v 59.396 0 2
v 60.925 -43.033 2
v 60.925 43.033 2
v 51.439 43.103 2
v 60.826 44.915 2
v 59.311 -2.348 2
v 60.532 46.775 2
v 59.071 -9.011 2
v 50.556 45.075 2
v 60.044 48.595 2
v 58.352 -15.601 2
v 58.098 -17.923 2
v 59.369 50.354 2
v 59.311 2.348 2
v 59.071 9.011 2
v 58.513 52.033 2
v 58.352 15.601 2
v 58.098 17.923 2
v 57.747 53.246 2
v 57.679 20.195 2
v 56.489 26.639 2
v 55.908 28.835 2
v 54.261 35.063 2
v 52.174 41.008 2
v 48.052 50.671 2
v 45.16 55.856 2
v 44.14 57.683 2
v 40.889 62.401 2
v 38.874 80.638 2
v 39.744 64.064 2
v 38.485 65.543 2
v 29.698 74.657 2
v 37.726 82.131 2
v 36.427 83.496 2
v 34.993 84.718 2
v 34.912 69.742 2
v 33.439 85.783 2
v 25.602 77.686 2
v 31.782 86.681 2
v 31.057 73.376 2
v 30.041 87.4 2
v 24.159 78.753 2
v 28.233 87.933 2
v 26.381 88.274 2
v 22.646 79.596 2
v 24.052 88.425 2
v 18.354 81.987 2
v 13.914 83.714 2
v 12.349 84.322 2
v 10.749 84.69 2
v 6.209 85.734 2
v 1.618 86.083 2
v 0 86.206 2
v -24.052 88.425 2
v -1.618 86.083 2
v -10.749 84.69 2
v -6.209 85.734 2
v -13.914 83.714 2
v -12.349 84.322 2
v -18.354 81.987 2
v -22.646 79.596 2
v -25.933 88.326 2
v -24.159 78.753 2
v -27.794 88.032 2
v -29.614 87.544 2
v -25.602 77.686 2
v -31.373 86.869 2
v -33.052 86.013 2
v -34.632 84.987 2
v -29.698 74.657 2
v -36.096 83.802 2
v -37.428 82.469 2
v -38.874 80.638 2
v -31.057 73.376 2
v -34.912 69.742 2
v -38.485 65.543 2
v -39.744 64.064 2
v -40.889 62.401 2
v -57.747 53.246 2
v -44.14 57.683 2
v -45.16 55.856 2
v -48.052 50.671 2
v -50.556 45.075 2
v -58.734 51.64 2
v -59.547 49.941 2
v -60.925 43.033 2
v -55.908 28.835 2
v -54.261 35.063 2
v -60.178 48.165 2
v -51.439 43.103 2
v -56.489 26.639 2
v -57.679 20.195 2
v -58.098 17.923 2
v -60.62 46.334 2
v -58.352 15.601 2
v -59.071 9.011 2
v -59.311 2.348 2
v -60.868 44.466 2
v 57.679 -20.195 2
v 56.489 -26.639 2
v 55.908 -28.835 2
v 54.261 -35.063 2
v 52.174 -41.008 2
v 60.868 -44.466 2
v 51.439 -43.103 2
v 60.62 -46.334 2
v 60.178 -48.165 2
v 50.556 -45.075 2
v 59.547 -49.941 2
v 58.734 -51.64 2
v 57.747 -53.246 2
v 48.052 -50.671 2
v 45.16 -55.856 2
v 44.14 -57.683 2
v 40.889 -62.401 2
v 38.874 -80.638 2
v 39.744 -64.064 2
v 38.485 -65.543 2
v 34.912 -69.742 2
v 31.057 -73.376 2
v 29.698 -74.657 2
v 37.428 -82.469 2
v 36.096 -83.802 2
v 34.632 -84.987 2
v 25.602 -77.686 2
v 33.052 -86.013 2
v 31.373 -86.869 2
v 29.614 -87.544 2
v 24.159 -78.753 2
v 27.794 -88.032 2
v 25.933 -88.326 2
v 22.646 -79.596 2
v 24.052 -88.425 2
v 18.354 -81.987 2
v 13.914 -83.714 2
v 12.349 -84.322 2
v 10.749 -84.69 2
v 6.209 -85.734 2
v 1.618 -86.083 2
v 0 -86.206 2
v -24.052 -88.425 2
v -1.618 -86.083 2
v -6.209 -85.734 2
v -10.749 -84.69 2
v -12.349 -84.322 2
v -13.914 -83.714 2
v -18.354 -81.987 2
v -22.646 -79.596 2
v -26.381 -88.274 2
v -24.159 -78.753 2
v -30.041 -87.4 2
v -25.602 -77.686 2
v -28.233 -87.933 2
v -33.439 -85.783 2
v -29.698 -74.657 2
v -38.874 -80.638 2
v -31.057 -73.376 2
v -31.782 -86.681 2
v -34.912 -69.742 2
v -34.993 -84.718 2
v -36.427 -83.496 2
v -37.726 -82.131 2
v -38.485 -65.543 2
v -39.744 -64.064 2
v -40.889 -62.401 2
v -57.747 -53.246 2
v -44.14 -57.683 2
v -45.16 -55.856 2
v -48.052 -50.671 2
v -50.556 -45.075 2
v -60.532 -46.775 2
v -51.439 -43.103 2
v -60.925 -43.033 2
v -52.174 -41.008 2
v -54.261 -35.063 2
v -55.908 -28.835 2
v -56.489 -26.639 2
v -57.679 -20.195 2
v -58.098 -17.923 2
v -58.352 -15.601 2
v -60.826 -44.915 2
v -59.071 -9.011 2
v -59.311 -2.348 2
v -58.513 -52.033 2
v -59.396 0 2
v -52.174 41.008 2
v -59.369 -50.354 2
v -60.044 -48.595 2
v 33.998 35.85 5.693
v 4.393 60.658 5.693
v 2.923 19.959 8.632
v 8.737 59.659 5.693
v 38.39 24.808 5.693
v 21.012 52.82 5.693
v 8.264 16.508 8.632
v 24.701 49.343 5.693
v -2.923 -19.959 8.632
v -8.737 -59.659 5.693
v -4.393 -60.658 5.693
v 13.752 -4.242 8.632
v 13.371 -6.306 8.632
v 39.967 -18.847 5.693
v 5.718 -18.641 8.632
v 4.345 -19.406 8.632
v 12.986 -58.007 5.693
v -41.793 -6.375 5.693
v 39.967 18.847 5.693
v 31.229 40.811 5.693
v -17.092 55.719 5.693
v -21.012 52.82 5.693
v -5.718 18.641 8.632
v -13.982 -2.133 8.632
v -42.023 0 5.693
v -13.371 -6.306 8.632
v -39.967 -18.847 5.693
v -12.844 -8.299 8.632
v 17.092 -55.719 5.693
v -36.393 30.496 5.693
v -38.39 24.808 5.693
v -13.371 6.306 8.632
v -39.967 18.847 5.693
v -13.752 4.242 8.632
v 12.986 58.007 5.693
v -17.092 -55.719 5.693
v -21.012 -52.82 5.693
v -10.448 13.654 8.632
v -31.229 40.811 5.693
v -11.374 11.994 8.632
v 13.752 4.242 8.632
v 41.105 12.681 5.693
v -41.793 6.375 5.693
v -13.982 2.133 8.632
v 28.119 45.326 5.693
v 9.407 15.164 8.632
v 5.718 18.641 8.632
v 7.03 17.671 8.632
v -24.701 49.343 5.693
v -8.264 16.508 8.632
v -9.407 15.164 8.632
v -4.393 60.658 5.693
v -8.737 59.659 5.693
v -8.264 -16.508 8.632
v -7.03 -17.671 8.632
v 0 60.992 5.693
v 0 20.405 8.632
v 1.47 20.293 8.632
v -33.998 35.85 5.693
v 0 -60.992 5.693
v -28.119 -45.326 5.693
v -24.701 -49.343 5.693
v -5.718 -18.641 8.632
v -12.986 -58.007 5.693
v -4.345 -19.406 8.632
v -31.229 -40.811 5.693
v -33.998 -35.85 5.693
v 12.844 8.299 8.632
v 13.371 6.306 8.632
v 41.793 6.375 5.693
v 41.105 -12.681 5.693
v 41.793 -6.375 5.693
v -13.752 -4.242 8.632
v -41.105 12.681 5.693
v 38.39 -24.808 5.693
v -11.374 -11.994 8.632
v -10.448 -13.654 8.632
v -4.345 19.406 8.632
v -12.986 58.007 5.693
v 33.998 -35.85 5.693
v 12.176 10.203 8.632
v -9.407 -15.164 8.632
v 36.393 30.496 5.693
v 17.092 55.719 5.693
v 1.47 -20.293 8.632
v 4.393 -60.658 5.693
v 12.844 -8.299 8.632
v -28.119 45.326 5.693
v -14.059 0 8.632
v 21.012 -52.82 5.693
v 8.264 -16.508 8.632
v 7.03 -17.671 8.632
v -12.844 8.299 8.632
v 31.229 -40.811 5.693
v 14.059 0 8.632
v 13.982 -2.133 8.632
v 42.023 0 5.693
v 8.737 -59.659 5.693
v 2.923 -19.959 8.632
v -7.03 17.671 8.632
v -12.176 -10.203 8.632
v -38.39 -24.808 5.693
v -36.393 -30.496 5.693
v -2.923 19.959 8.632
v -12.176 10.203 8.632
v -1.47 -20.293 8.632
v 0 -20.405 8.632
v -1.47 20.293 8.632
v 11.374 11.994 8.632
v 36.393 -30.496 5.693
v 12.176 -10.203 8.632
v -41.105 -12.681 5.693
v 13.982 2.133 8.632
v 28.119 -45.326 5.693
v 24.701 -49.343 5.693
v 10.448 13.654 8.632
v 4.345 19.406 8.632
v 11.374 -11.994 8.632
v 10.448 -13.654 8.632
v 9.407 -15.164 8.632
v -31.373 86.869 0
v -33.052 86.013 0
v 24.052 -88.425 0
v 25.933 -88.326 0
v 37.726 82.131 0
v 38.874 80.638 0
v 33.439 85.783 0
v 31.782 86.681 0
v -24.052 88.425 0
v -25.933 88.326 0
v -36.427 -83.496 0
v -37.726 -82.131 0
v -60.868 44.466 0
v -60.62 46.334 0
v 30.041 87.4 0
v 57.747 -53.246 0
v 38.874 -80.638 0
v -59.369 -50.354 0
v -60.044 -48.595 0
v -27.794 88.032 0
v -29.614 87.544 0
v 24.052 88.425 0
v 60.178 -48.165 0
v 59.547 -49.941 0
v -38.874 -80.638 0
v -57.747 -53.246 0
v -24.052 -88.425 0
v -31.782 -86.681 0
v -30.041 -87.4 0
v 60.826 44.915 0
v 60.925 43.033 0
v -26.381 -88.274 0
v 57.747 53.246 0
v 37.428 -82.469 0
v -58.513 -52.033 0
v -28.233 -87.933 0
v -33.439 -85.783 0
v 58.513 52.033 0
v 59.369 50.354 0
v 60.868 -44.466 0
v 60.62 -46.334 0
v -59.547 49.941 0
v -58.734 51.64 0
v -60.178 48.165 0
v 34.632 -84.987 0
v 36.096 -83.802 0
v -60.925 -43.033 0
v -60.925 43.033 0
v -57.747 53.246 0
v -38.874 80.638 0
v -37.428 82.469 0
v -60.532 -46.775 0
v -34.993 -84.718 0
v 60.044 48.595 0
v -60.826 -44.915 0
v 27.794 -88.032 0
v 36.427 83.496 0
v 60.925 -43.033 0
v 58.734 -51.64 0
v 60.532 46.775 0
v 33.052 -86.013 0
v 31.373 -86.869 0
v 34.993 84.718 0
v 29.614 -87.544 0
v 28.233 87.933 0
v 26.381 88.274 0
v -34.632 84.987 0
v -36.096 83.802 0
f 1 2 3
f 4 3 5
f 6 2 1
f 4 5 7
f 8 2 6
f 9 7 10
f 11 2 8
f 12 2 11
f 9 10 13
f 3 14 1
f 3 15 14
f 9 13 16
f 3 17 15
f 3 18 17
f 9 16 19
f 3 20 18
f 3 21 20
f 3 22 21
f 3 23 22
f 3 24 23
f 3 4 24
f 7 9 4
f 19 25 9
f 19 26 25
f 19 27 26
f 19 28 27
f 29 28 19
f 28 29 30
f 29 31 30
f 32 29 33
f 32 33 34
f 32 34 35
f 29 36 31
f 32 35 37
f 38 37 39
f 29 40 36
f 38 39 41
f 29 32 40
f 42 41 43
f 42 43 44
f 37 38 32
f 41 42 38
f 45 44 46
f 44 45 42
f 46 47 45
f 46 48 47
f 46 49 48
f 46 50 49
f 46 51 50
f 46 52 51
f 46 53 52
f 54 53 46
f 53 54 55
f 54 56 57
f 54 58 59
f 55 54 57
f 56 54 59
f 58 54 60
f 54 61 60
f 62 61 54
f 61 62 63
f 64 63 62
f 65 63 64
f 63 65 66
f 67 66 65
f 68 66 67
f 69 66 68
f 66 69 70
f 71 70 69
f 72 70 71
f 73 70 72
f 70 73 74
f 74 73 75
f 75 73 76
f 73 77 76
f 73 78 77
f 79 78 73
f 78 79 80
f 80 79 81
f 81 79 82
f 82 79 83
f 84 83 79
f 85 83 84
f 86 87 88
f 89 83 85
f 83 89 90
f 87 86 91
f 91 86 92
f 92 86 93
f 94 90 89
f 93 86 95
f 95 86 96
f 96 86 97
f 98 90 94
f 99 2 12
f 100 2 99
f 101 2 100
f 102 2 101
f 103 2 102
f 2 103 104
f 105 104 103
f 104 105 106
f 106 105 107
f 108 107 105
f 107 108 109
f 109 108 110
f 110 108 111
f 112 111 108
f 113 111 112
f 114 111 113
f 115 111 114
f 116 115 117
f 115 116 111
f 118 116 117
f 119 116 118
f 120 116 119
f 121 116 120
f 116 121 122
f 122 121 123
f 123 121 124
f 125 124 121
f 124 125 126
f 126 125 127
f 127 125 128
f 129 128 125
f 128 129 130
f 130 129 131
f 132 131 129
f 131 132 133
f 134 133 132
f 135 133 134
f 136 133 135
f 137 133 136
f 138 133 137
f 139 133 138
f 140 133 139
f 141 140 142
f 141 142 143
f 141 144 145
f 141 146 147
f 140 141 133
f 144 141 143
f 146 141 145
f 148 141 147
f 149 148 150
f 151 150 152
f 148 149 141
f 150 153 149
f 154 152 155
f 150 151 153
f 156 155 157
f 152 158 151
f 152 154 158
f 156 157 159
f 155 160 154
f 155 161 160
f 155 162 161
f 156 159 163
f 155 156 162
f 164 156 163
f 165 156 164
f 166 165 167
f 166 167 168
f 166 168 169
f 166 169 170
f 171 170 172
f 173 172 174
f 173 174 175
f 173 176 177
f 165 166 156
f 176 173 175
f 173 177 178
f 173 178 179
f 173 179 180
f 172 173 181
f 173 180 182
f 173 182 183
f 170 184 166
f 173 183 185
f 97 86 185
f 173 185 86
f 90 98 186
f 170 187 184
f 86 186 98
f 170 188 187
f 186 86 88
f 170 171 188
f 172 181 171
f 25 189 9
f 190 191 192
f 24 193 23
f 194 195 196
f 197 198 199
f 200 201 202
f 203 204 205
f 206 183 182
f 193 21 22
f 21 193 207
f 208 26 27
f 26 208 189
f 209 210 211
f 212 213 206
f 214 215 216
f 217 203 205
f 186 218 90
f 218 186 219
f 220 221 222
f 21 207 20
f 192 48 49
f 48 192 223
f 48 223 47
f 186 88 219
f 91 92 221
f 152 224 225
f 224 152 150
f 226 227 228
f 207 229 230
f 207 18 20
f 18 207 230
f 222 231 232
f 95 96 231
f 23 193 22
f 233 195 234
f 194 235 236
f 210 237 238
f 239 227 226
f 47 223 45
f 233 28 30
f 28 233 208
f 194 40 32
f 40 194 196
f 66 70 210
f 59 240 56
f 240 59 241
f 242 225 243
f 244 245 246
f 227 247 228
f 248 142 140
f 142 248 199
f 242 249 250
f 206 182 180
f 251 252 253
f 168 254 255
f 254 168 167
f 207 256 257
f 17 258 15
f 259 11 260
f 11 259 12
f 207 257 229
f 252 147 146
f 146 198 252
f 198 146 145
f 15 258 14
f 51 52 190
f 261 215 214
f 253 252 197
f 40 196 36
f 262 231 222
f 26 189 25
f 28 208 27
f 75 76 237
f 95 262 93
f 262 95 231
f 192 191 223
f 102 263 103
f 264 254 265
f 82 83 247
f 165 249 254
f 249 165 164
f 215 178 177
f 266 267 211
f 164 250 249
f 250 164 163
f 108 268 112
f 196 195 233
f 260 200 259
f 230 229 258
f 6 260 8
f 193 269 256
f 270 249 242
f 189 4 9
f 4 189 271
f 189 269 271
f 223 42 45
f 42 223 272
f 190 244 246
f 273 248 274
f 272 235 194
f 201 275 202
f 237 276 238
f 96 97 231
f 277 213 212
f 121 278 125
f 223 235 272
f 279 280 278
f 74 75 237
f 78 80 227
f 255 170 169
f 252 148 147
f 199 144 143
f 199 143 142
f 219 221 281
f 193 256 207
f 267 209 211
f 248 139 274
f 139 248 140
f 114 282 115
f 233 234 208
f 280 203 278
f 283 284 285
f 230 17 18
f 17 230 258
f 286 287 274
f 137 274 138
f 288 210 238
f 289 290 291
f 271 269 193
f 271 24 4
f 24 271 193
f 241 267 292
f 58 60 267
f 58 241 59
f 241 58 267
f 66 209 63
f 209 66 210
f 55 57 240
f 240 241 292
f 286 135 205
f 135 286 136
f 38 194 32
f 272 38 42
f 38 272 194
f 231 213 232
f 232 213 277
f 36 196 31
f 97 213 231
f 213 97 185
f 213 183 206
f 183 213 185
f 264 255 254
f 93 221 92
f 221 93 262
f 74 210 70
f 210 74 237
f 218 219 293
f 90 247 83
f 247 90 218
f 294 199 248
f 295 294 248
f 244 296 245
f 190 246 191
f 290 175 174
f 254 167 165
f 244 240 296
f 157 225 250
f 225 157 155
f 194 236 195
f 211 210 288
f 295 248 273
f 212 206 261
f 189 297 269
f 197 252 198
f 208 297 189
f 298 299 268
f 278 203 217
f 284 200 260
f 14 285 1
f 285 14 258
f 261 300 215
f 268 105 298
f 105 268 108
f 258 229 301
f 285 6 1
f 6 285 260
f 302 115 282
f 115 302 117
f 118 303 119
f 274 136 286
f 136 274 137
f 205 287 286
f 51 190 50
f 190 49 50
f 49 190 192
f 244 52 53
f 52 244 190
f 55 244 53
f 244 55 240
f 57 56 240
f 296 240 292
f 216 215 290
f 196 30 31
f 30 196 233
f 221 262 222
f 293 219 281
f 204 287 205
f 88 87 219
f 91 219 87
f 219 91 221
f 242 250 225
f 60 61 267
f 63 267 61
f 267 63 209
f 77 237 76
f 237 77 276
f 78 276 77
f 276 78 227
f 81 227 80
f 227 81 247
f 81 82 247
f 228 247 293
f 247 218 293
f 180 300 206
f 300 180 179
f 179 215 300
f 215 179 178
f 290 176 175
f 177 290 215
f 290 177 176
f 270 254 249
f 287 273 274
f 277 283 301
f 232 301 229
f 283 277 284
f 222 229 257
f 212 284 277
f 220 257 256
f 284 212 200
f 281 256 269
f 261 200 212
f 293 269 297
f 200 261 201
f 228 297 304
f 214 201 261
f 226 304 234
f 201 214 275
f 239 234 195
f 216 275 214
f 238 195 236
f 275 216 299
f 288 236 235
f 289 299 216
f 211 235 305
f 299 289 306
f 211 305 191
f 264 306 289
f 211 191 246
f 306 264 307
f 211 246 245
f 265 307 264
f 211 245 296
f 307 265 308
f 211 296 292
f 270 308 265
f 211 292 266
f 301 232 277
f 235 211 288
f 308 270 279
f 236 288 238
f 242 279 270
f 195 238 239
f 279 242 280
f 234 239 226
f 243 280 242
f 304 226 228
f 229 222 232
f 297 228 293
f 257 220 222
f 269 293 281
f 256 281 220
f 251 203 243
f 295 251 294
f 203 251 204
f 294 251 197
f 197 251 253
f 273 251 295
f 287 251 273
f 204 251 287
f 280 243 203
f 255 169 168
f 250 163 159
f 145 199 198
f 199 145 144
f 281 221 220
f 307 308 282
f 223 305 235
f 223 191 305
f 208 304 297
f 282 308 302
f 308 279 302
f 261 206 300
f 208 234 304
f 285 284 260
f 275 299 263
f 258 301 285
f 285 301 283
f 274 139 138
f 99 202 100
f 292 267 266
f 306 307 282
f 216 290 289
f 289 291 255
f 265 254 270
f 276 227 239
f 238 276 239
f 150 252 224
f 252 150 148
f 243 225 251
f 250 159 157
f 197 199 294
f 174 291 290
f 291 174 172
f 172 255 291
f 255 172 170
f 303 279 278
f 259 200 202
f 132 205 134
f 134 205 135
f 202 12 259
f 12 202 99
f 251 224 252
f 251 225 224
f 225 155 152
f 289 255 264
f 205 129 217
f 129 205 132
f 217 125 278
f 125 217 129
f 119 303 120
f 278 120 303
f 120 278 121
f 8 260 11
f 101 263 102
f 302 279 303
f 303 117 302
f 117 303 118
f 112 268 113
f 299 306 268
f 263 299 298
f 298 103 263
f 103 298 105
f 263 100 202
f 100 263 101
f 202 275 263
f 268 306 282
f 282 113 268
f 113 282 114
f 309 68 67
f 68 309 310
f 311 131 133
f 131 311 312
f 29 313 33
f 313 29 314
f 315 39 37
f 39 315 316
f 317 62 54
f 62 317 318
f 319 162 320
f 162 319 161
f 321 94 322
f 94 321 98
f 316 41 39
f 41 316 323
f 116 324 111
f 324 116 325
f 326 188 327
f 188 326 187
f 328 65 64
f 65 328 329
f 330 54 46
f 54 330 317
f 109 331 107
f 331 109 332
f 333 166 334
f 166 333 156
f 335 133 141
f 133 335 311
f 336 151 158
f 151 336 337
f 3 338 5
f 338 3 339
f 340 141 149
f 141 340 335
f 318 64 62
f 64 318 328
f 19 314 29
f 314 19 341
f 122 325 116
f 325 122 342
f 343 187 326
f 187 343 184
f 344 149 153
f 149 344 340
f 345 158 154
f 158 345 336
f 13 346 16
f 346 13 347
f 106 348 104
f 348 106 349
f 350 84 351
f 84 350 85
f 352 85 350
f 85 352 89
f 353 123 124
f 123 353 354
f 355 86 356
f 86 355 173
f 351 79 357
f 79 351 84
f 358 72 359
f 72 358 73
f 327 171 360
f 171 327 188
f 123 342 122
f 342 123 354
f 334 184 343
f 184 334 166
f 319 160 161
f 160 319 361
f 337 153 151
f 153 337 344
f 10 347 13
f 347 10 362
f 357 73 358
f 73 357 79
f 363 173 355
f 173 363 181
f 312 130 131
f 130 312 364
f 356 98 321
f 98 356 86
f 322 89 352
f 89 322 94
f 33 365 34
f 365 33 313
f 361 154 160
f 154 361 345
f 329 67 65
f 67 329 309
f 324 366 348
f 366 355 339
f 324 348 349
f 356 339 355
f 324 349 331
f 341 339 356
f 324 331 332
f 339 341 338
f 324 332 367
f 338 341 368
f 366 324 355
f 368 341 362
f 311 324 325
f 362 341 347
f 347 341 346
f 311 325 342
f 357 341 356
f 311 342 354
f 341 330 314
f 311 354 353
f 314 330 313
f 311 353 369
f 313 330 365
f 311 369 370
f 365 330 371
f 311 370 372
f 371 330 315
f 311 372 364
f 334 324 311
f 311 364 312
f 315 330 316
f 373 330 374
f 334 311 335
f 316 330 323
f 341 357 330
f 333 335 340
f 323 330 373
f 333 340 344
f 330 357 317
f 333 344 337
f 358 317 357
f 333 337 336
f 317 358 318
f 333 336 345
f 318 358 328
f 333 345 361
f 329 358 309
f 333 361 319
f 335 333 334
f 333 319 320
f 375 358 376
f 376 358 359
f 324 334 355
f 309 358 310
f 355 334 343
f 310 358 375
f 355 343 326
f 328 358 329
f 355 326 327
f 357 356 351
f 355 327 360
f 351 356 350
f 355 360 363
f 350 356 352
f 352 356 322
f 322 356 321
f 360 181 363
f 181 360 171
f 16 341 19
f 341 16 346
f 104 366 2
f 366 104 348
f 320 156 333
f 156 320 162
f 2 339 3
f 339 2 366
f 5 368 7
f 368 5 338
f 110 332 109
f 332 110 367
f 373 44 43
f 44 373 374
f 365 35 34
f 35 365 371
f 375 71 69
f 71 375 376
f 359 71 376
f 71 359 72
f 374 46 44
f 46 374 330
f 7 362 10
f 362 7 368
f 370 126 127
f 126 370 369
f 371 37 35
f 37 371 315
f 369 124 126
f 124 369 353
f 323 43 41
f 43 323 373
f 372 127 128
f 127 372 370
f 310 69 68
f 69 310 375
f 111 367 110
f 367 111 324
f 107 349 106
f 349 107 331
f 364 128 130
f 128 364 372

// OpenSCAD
/**
 * Standalone curved rectangular-octagon mirror lens
 * OpenSCAD
 */

/* [Lens Dimensions] */
lens_width = 121.85;
lens_height = 176.85;
lens_edge_thickness = 2.0;
lens_center_thickness = 9.0;

/* [Lens Shape] */
octagon_facets_factor = 0.45;
lens_corner_roundness = 18.0;

/* [Curve Quality] */
lens_slices = 180;
$fn = 60;


/* Render */
curved_rect_octagon_lens();


module curved_rect_octagon_lens() {
    lens_dome_rise = lens_center_thickness - lens_edge_thickness;

    color("LightCyan", 0.45)
    union() {
        // Flat minimum-thickness lens body: 3mm at the thinnest point.
        linear_extrude(height = lens_edge_thickness)
            lens_2d_profile();

        // Convex lens dome.
        // This approximates a smooth curved top by stacking many shrinking slices.
        for (i = [0 : lens_slices - 1]) {
            t0 = i / lens_slices;
            t1 = (i + 1) / lens_slices;

            z0 = lens_edge_thickness + lens_dome_rise * sin(t0 * 90);
            z1 = lens_edge_thickness + lens_dome_rise * sin(t1 * 90);

            s0 = lens_scale_at_height(t0);
            s1 = lens_scale_at_height(t1);

            translate([0, 0, z0])
                linear_extrude(height = z1 - z0, scale = s1 / s0)
                    scale([s0, s0, 1])
                        lens_2d_profile();
        }
    }
}


function lens_scale_at_height(t) =
    1 - 0.045 * pow(t, 1.8);


module lens_2d_profile() {
    rounded_octagon(
        w = lens_width,
        h = lens_height,
        factor = octagon_facets_factor,
        r_val = lens_corner_roundness
    );
}


module rounded_octagon(w, h, factor, r_val) {
    offset(r = r_val) {
        offset(r = -r_val) {
            polygon(points = [
                [ w * (1 - factor) / 2,  h / 2],
                [ w / 2,                  h * (1 - factor) / 2],
                [ w / 2,                 -h * (1 - factor) / 2],
                [ w * (1 - factor) / 2, -h / 2],
                [-w * (1 - factor) / 2, -h / 2],
                [-w / 2,                 -h * (1 - factor) / 2],
                [-w / 2,                  h * (1 - factor) / 2],
                [-w * (1 - factor) / 2,  h / 2]
            ]);
        }
    }
}

/* [Curve Quality] */
sphere_quality = 60;


/* Render */
curved_rect_octagon_lens();


module curved_rect_octagon_lens() {
    lens_dome_rise = lens_center_thickness - lens_edge_thickness;

    // Stretch the sphere in Y so its footprint better matches the lens shape.
    y_scale = lens_height / lens_width;

    // Use the half-width as the reference cap radius.
    // After scaling in Y, the cap also reaches approximately half-height.
    aperture_radius = lens_width / 2;

    sphere_radius = spherical_cap_radius(aperture_radius, lens_dome_rise);

    // Top of ellipsoid lands at lens_center_thickness.
    sphere_center_z = lens_center_thickness - sphere_radius;

    color("LightCyan", 1)
    union() {
        // Flat minimum-thickness body.
        linear_extrude(height = lens_edge_thickness)
            lens_2d_profile();

        // Ellipsoidal dome clipped to the octagonal lens outline.
        intersection() {
            // Vertical clipping volume.
            translate([0, 0, lens_edge_thickness])
                linear_extrude(height = lens_dome_rise + 0.02)
                    lens_2d_profile();

            // Scaled sphere = ellipsoid.
            translate([0, 0, sphere_center_z])
                scale([1, y_scale, 1])
                    sphere(r = sphere_radius, $fn = sphere_quality);
        }
    }
}


function spherical_cap_radius(aperture_radius, rise) =
    (pow(aperture_radius, 2) + pow(rise, 2)) / (2 * rise);
